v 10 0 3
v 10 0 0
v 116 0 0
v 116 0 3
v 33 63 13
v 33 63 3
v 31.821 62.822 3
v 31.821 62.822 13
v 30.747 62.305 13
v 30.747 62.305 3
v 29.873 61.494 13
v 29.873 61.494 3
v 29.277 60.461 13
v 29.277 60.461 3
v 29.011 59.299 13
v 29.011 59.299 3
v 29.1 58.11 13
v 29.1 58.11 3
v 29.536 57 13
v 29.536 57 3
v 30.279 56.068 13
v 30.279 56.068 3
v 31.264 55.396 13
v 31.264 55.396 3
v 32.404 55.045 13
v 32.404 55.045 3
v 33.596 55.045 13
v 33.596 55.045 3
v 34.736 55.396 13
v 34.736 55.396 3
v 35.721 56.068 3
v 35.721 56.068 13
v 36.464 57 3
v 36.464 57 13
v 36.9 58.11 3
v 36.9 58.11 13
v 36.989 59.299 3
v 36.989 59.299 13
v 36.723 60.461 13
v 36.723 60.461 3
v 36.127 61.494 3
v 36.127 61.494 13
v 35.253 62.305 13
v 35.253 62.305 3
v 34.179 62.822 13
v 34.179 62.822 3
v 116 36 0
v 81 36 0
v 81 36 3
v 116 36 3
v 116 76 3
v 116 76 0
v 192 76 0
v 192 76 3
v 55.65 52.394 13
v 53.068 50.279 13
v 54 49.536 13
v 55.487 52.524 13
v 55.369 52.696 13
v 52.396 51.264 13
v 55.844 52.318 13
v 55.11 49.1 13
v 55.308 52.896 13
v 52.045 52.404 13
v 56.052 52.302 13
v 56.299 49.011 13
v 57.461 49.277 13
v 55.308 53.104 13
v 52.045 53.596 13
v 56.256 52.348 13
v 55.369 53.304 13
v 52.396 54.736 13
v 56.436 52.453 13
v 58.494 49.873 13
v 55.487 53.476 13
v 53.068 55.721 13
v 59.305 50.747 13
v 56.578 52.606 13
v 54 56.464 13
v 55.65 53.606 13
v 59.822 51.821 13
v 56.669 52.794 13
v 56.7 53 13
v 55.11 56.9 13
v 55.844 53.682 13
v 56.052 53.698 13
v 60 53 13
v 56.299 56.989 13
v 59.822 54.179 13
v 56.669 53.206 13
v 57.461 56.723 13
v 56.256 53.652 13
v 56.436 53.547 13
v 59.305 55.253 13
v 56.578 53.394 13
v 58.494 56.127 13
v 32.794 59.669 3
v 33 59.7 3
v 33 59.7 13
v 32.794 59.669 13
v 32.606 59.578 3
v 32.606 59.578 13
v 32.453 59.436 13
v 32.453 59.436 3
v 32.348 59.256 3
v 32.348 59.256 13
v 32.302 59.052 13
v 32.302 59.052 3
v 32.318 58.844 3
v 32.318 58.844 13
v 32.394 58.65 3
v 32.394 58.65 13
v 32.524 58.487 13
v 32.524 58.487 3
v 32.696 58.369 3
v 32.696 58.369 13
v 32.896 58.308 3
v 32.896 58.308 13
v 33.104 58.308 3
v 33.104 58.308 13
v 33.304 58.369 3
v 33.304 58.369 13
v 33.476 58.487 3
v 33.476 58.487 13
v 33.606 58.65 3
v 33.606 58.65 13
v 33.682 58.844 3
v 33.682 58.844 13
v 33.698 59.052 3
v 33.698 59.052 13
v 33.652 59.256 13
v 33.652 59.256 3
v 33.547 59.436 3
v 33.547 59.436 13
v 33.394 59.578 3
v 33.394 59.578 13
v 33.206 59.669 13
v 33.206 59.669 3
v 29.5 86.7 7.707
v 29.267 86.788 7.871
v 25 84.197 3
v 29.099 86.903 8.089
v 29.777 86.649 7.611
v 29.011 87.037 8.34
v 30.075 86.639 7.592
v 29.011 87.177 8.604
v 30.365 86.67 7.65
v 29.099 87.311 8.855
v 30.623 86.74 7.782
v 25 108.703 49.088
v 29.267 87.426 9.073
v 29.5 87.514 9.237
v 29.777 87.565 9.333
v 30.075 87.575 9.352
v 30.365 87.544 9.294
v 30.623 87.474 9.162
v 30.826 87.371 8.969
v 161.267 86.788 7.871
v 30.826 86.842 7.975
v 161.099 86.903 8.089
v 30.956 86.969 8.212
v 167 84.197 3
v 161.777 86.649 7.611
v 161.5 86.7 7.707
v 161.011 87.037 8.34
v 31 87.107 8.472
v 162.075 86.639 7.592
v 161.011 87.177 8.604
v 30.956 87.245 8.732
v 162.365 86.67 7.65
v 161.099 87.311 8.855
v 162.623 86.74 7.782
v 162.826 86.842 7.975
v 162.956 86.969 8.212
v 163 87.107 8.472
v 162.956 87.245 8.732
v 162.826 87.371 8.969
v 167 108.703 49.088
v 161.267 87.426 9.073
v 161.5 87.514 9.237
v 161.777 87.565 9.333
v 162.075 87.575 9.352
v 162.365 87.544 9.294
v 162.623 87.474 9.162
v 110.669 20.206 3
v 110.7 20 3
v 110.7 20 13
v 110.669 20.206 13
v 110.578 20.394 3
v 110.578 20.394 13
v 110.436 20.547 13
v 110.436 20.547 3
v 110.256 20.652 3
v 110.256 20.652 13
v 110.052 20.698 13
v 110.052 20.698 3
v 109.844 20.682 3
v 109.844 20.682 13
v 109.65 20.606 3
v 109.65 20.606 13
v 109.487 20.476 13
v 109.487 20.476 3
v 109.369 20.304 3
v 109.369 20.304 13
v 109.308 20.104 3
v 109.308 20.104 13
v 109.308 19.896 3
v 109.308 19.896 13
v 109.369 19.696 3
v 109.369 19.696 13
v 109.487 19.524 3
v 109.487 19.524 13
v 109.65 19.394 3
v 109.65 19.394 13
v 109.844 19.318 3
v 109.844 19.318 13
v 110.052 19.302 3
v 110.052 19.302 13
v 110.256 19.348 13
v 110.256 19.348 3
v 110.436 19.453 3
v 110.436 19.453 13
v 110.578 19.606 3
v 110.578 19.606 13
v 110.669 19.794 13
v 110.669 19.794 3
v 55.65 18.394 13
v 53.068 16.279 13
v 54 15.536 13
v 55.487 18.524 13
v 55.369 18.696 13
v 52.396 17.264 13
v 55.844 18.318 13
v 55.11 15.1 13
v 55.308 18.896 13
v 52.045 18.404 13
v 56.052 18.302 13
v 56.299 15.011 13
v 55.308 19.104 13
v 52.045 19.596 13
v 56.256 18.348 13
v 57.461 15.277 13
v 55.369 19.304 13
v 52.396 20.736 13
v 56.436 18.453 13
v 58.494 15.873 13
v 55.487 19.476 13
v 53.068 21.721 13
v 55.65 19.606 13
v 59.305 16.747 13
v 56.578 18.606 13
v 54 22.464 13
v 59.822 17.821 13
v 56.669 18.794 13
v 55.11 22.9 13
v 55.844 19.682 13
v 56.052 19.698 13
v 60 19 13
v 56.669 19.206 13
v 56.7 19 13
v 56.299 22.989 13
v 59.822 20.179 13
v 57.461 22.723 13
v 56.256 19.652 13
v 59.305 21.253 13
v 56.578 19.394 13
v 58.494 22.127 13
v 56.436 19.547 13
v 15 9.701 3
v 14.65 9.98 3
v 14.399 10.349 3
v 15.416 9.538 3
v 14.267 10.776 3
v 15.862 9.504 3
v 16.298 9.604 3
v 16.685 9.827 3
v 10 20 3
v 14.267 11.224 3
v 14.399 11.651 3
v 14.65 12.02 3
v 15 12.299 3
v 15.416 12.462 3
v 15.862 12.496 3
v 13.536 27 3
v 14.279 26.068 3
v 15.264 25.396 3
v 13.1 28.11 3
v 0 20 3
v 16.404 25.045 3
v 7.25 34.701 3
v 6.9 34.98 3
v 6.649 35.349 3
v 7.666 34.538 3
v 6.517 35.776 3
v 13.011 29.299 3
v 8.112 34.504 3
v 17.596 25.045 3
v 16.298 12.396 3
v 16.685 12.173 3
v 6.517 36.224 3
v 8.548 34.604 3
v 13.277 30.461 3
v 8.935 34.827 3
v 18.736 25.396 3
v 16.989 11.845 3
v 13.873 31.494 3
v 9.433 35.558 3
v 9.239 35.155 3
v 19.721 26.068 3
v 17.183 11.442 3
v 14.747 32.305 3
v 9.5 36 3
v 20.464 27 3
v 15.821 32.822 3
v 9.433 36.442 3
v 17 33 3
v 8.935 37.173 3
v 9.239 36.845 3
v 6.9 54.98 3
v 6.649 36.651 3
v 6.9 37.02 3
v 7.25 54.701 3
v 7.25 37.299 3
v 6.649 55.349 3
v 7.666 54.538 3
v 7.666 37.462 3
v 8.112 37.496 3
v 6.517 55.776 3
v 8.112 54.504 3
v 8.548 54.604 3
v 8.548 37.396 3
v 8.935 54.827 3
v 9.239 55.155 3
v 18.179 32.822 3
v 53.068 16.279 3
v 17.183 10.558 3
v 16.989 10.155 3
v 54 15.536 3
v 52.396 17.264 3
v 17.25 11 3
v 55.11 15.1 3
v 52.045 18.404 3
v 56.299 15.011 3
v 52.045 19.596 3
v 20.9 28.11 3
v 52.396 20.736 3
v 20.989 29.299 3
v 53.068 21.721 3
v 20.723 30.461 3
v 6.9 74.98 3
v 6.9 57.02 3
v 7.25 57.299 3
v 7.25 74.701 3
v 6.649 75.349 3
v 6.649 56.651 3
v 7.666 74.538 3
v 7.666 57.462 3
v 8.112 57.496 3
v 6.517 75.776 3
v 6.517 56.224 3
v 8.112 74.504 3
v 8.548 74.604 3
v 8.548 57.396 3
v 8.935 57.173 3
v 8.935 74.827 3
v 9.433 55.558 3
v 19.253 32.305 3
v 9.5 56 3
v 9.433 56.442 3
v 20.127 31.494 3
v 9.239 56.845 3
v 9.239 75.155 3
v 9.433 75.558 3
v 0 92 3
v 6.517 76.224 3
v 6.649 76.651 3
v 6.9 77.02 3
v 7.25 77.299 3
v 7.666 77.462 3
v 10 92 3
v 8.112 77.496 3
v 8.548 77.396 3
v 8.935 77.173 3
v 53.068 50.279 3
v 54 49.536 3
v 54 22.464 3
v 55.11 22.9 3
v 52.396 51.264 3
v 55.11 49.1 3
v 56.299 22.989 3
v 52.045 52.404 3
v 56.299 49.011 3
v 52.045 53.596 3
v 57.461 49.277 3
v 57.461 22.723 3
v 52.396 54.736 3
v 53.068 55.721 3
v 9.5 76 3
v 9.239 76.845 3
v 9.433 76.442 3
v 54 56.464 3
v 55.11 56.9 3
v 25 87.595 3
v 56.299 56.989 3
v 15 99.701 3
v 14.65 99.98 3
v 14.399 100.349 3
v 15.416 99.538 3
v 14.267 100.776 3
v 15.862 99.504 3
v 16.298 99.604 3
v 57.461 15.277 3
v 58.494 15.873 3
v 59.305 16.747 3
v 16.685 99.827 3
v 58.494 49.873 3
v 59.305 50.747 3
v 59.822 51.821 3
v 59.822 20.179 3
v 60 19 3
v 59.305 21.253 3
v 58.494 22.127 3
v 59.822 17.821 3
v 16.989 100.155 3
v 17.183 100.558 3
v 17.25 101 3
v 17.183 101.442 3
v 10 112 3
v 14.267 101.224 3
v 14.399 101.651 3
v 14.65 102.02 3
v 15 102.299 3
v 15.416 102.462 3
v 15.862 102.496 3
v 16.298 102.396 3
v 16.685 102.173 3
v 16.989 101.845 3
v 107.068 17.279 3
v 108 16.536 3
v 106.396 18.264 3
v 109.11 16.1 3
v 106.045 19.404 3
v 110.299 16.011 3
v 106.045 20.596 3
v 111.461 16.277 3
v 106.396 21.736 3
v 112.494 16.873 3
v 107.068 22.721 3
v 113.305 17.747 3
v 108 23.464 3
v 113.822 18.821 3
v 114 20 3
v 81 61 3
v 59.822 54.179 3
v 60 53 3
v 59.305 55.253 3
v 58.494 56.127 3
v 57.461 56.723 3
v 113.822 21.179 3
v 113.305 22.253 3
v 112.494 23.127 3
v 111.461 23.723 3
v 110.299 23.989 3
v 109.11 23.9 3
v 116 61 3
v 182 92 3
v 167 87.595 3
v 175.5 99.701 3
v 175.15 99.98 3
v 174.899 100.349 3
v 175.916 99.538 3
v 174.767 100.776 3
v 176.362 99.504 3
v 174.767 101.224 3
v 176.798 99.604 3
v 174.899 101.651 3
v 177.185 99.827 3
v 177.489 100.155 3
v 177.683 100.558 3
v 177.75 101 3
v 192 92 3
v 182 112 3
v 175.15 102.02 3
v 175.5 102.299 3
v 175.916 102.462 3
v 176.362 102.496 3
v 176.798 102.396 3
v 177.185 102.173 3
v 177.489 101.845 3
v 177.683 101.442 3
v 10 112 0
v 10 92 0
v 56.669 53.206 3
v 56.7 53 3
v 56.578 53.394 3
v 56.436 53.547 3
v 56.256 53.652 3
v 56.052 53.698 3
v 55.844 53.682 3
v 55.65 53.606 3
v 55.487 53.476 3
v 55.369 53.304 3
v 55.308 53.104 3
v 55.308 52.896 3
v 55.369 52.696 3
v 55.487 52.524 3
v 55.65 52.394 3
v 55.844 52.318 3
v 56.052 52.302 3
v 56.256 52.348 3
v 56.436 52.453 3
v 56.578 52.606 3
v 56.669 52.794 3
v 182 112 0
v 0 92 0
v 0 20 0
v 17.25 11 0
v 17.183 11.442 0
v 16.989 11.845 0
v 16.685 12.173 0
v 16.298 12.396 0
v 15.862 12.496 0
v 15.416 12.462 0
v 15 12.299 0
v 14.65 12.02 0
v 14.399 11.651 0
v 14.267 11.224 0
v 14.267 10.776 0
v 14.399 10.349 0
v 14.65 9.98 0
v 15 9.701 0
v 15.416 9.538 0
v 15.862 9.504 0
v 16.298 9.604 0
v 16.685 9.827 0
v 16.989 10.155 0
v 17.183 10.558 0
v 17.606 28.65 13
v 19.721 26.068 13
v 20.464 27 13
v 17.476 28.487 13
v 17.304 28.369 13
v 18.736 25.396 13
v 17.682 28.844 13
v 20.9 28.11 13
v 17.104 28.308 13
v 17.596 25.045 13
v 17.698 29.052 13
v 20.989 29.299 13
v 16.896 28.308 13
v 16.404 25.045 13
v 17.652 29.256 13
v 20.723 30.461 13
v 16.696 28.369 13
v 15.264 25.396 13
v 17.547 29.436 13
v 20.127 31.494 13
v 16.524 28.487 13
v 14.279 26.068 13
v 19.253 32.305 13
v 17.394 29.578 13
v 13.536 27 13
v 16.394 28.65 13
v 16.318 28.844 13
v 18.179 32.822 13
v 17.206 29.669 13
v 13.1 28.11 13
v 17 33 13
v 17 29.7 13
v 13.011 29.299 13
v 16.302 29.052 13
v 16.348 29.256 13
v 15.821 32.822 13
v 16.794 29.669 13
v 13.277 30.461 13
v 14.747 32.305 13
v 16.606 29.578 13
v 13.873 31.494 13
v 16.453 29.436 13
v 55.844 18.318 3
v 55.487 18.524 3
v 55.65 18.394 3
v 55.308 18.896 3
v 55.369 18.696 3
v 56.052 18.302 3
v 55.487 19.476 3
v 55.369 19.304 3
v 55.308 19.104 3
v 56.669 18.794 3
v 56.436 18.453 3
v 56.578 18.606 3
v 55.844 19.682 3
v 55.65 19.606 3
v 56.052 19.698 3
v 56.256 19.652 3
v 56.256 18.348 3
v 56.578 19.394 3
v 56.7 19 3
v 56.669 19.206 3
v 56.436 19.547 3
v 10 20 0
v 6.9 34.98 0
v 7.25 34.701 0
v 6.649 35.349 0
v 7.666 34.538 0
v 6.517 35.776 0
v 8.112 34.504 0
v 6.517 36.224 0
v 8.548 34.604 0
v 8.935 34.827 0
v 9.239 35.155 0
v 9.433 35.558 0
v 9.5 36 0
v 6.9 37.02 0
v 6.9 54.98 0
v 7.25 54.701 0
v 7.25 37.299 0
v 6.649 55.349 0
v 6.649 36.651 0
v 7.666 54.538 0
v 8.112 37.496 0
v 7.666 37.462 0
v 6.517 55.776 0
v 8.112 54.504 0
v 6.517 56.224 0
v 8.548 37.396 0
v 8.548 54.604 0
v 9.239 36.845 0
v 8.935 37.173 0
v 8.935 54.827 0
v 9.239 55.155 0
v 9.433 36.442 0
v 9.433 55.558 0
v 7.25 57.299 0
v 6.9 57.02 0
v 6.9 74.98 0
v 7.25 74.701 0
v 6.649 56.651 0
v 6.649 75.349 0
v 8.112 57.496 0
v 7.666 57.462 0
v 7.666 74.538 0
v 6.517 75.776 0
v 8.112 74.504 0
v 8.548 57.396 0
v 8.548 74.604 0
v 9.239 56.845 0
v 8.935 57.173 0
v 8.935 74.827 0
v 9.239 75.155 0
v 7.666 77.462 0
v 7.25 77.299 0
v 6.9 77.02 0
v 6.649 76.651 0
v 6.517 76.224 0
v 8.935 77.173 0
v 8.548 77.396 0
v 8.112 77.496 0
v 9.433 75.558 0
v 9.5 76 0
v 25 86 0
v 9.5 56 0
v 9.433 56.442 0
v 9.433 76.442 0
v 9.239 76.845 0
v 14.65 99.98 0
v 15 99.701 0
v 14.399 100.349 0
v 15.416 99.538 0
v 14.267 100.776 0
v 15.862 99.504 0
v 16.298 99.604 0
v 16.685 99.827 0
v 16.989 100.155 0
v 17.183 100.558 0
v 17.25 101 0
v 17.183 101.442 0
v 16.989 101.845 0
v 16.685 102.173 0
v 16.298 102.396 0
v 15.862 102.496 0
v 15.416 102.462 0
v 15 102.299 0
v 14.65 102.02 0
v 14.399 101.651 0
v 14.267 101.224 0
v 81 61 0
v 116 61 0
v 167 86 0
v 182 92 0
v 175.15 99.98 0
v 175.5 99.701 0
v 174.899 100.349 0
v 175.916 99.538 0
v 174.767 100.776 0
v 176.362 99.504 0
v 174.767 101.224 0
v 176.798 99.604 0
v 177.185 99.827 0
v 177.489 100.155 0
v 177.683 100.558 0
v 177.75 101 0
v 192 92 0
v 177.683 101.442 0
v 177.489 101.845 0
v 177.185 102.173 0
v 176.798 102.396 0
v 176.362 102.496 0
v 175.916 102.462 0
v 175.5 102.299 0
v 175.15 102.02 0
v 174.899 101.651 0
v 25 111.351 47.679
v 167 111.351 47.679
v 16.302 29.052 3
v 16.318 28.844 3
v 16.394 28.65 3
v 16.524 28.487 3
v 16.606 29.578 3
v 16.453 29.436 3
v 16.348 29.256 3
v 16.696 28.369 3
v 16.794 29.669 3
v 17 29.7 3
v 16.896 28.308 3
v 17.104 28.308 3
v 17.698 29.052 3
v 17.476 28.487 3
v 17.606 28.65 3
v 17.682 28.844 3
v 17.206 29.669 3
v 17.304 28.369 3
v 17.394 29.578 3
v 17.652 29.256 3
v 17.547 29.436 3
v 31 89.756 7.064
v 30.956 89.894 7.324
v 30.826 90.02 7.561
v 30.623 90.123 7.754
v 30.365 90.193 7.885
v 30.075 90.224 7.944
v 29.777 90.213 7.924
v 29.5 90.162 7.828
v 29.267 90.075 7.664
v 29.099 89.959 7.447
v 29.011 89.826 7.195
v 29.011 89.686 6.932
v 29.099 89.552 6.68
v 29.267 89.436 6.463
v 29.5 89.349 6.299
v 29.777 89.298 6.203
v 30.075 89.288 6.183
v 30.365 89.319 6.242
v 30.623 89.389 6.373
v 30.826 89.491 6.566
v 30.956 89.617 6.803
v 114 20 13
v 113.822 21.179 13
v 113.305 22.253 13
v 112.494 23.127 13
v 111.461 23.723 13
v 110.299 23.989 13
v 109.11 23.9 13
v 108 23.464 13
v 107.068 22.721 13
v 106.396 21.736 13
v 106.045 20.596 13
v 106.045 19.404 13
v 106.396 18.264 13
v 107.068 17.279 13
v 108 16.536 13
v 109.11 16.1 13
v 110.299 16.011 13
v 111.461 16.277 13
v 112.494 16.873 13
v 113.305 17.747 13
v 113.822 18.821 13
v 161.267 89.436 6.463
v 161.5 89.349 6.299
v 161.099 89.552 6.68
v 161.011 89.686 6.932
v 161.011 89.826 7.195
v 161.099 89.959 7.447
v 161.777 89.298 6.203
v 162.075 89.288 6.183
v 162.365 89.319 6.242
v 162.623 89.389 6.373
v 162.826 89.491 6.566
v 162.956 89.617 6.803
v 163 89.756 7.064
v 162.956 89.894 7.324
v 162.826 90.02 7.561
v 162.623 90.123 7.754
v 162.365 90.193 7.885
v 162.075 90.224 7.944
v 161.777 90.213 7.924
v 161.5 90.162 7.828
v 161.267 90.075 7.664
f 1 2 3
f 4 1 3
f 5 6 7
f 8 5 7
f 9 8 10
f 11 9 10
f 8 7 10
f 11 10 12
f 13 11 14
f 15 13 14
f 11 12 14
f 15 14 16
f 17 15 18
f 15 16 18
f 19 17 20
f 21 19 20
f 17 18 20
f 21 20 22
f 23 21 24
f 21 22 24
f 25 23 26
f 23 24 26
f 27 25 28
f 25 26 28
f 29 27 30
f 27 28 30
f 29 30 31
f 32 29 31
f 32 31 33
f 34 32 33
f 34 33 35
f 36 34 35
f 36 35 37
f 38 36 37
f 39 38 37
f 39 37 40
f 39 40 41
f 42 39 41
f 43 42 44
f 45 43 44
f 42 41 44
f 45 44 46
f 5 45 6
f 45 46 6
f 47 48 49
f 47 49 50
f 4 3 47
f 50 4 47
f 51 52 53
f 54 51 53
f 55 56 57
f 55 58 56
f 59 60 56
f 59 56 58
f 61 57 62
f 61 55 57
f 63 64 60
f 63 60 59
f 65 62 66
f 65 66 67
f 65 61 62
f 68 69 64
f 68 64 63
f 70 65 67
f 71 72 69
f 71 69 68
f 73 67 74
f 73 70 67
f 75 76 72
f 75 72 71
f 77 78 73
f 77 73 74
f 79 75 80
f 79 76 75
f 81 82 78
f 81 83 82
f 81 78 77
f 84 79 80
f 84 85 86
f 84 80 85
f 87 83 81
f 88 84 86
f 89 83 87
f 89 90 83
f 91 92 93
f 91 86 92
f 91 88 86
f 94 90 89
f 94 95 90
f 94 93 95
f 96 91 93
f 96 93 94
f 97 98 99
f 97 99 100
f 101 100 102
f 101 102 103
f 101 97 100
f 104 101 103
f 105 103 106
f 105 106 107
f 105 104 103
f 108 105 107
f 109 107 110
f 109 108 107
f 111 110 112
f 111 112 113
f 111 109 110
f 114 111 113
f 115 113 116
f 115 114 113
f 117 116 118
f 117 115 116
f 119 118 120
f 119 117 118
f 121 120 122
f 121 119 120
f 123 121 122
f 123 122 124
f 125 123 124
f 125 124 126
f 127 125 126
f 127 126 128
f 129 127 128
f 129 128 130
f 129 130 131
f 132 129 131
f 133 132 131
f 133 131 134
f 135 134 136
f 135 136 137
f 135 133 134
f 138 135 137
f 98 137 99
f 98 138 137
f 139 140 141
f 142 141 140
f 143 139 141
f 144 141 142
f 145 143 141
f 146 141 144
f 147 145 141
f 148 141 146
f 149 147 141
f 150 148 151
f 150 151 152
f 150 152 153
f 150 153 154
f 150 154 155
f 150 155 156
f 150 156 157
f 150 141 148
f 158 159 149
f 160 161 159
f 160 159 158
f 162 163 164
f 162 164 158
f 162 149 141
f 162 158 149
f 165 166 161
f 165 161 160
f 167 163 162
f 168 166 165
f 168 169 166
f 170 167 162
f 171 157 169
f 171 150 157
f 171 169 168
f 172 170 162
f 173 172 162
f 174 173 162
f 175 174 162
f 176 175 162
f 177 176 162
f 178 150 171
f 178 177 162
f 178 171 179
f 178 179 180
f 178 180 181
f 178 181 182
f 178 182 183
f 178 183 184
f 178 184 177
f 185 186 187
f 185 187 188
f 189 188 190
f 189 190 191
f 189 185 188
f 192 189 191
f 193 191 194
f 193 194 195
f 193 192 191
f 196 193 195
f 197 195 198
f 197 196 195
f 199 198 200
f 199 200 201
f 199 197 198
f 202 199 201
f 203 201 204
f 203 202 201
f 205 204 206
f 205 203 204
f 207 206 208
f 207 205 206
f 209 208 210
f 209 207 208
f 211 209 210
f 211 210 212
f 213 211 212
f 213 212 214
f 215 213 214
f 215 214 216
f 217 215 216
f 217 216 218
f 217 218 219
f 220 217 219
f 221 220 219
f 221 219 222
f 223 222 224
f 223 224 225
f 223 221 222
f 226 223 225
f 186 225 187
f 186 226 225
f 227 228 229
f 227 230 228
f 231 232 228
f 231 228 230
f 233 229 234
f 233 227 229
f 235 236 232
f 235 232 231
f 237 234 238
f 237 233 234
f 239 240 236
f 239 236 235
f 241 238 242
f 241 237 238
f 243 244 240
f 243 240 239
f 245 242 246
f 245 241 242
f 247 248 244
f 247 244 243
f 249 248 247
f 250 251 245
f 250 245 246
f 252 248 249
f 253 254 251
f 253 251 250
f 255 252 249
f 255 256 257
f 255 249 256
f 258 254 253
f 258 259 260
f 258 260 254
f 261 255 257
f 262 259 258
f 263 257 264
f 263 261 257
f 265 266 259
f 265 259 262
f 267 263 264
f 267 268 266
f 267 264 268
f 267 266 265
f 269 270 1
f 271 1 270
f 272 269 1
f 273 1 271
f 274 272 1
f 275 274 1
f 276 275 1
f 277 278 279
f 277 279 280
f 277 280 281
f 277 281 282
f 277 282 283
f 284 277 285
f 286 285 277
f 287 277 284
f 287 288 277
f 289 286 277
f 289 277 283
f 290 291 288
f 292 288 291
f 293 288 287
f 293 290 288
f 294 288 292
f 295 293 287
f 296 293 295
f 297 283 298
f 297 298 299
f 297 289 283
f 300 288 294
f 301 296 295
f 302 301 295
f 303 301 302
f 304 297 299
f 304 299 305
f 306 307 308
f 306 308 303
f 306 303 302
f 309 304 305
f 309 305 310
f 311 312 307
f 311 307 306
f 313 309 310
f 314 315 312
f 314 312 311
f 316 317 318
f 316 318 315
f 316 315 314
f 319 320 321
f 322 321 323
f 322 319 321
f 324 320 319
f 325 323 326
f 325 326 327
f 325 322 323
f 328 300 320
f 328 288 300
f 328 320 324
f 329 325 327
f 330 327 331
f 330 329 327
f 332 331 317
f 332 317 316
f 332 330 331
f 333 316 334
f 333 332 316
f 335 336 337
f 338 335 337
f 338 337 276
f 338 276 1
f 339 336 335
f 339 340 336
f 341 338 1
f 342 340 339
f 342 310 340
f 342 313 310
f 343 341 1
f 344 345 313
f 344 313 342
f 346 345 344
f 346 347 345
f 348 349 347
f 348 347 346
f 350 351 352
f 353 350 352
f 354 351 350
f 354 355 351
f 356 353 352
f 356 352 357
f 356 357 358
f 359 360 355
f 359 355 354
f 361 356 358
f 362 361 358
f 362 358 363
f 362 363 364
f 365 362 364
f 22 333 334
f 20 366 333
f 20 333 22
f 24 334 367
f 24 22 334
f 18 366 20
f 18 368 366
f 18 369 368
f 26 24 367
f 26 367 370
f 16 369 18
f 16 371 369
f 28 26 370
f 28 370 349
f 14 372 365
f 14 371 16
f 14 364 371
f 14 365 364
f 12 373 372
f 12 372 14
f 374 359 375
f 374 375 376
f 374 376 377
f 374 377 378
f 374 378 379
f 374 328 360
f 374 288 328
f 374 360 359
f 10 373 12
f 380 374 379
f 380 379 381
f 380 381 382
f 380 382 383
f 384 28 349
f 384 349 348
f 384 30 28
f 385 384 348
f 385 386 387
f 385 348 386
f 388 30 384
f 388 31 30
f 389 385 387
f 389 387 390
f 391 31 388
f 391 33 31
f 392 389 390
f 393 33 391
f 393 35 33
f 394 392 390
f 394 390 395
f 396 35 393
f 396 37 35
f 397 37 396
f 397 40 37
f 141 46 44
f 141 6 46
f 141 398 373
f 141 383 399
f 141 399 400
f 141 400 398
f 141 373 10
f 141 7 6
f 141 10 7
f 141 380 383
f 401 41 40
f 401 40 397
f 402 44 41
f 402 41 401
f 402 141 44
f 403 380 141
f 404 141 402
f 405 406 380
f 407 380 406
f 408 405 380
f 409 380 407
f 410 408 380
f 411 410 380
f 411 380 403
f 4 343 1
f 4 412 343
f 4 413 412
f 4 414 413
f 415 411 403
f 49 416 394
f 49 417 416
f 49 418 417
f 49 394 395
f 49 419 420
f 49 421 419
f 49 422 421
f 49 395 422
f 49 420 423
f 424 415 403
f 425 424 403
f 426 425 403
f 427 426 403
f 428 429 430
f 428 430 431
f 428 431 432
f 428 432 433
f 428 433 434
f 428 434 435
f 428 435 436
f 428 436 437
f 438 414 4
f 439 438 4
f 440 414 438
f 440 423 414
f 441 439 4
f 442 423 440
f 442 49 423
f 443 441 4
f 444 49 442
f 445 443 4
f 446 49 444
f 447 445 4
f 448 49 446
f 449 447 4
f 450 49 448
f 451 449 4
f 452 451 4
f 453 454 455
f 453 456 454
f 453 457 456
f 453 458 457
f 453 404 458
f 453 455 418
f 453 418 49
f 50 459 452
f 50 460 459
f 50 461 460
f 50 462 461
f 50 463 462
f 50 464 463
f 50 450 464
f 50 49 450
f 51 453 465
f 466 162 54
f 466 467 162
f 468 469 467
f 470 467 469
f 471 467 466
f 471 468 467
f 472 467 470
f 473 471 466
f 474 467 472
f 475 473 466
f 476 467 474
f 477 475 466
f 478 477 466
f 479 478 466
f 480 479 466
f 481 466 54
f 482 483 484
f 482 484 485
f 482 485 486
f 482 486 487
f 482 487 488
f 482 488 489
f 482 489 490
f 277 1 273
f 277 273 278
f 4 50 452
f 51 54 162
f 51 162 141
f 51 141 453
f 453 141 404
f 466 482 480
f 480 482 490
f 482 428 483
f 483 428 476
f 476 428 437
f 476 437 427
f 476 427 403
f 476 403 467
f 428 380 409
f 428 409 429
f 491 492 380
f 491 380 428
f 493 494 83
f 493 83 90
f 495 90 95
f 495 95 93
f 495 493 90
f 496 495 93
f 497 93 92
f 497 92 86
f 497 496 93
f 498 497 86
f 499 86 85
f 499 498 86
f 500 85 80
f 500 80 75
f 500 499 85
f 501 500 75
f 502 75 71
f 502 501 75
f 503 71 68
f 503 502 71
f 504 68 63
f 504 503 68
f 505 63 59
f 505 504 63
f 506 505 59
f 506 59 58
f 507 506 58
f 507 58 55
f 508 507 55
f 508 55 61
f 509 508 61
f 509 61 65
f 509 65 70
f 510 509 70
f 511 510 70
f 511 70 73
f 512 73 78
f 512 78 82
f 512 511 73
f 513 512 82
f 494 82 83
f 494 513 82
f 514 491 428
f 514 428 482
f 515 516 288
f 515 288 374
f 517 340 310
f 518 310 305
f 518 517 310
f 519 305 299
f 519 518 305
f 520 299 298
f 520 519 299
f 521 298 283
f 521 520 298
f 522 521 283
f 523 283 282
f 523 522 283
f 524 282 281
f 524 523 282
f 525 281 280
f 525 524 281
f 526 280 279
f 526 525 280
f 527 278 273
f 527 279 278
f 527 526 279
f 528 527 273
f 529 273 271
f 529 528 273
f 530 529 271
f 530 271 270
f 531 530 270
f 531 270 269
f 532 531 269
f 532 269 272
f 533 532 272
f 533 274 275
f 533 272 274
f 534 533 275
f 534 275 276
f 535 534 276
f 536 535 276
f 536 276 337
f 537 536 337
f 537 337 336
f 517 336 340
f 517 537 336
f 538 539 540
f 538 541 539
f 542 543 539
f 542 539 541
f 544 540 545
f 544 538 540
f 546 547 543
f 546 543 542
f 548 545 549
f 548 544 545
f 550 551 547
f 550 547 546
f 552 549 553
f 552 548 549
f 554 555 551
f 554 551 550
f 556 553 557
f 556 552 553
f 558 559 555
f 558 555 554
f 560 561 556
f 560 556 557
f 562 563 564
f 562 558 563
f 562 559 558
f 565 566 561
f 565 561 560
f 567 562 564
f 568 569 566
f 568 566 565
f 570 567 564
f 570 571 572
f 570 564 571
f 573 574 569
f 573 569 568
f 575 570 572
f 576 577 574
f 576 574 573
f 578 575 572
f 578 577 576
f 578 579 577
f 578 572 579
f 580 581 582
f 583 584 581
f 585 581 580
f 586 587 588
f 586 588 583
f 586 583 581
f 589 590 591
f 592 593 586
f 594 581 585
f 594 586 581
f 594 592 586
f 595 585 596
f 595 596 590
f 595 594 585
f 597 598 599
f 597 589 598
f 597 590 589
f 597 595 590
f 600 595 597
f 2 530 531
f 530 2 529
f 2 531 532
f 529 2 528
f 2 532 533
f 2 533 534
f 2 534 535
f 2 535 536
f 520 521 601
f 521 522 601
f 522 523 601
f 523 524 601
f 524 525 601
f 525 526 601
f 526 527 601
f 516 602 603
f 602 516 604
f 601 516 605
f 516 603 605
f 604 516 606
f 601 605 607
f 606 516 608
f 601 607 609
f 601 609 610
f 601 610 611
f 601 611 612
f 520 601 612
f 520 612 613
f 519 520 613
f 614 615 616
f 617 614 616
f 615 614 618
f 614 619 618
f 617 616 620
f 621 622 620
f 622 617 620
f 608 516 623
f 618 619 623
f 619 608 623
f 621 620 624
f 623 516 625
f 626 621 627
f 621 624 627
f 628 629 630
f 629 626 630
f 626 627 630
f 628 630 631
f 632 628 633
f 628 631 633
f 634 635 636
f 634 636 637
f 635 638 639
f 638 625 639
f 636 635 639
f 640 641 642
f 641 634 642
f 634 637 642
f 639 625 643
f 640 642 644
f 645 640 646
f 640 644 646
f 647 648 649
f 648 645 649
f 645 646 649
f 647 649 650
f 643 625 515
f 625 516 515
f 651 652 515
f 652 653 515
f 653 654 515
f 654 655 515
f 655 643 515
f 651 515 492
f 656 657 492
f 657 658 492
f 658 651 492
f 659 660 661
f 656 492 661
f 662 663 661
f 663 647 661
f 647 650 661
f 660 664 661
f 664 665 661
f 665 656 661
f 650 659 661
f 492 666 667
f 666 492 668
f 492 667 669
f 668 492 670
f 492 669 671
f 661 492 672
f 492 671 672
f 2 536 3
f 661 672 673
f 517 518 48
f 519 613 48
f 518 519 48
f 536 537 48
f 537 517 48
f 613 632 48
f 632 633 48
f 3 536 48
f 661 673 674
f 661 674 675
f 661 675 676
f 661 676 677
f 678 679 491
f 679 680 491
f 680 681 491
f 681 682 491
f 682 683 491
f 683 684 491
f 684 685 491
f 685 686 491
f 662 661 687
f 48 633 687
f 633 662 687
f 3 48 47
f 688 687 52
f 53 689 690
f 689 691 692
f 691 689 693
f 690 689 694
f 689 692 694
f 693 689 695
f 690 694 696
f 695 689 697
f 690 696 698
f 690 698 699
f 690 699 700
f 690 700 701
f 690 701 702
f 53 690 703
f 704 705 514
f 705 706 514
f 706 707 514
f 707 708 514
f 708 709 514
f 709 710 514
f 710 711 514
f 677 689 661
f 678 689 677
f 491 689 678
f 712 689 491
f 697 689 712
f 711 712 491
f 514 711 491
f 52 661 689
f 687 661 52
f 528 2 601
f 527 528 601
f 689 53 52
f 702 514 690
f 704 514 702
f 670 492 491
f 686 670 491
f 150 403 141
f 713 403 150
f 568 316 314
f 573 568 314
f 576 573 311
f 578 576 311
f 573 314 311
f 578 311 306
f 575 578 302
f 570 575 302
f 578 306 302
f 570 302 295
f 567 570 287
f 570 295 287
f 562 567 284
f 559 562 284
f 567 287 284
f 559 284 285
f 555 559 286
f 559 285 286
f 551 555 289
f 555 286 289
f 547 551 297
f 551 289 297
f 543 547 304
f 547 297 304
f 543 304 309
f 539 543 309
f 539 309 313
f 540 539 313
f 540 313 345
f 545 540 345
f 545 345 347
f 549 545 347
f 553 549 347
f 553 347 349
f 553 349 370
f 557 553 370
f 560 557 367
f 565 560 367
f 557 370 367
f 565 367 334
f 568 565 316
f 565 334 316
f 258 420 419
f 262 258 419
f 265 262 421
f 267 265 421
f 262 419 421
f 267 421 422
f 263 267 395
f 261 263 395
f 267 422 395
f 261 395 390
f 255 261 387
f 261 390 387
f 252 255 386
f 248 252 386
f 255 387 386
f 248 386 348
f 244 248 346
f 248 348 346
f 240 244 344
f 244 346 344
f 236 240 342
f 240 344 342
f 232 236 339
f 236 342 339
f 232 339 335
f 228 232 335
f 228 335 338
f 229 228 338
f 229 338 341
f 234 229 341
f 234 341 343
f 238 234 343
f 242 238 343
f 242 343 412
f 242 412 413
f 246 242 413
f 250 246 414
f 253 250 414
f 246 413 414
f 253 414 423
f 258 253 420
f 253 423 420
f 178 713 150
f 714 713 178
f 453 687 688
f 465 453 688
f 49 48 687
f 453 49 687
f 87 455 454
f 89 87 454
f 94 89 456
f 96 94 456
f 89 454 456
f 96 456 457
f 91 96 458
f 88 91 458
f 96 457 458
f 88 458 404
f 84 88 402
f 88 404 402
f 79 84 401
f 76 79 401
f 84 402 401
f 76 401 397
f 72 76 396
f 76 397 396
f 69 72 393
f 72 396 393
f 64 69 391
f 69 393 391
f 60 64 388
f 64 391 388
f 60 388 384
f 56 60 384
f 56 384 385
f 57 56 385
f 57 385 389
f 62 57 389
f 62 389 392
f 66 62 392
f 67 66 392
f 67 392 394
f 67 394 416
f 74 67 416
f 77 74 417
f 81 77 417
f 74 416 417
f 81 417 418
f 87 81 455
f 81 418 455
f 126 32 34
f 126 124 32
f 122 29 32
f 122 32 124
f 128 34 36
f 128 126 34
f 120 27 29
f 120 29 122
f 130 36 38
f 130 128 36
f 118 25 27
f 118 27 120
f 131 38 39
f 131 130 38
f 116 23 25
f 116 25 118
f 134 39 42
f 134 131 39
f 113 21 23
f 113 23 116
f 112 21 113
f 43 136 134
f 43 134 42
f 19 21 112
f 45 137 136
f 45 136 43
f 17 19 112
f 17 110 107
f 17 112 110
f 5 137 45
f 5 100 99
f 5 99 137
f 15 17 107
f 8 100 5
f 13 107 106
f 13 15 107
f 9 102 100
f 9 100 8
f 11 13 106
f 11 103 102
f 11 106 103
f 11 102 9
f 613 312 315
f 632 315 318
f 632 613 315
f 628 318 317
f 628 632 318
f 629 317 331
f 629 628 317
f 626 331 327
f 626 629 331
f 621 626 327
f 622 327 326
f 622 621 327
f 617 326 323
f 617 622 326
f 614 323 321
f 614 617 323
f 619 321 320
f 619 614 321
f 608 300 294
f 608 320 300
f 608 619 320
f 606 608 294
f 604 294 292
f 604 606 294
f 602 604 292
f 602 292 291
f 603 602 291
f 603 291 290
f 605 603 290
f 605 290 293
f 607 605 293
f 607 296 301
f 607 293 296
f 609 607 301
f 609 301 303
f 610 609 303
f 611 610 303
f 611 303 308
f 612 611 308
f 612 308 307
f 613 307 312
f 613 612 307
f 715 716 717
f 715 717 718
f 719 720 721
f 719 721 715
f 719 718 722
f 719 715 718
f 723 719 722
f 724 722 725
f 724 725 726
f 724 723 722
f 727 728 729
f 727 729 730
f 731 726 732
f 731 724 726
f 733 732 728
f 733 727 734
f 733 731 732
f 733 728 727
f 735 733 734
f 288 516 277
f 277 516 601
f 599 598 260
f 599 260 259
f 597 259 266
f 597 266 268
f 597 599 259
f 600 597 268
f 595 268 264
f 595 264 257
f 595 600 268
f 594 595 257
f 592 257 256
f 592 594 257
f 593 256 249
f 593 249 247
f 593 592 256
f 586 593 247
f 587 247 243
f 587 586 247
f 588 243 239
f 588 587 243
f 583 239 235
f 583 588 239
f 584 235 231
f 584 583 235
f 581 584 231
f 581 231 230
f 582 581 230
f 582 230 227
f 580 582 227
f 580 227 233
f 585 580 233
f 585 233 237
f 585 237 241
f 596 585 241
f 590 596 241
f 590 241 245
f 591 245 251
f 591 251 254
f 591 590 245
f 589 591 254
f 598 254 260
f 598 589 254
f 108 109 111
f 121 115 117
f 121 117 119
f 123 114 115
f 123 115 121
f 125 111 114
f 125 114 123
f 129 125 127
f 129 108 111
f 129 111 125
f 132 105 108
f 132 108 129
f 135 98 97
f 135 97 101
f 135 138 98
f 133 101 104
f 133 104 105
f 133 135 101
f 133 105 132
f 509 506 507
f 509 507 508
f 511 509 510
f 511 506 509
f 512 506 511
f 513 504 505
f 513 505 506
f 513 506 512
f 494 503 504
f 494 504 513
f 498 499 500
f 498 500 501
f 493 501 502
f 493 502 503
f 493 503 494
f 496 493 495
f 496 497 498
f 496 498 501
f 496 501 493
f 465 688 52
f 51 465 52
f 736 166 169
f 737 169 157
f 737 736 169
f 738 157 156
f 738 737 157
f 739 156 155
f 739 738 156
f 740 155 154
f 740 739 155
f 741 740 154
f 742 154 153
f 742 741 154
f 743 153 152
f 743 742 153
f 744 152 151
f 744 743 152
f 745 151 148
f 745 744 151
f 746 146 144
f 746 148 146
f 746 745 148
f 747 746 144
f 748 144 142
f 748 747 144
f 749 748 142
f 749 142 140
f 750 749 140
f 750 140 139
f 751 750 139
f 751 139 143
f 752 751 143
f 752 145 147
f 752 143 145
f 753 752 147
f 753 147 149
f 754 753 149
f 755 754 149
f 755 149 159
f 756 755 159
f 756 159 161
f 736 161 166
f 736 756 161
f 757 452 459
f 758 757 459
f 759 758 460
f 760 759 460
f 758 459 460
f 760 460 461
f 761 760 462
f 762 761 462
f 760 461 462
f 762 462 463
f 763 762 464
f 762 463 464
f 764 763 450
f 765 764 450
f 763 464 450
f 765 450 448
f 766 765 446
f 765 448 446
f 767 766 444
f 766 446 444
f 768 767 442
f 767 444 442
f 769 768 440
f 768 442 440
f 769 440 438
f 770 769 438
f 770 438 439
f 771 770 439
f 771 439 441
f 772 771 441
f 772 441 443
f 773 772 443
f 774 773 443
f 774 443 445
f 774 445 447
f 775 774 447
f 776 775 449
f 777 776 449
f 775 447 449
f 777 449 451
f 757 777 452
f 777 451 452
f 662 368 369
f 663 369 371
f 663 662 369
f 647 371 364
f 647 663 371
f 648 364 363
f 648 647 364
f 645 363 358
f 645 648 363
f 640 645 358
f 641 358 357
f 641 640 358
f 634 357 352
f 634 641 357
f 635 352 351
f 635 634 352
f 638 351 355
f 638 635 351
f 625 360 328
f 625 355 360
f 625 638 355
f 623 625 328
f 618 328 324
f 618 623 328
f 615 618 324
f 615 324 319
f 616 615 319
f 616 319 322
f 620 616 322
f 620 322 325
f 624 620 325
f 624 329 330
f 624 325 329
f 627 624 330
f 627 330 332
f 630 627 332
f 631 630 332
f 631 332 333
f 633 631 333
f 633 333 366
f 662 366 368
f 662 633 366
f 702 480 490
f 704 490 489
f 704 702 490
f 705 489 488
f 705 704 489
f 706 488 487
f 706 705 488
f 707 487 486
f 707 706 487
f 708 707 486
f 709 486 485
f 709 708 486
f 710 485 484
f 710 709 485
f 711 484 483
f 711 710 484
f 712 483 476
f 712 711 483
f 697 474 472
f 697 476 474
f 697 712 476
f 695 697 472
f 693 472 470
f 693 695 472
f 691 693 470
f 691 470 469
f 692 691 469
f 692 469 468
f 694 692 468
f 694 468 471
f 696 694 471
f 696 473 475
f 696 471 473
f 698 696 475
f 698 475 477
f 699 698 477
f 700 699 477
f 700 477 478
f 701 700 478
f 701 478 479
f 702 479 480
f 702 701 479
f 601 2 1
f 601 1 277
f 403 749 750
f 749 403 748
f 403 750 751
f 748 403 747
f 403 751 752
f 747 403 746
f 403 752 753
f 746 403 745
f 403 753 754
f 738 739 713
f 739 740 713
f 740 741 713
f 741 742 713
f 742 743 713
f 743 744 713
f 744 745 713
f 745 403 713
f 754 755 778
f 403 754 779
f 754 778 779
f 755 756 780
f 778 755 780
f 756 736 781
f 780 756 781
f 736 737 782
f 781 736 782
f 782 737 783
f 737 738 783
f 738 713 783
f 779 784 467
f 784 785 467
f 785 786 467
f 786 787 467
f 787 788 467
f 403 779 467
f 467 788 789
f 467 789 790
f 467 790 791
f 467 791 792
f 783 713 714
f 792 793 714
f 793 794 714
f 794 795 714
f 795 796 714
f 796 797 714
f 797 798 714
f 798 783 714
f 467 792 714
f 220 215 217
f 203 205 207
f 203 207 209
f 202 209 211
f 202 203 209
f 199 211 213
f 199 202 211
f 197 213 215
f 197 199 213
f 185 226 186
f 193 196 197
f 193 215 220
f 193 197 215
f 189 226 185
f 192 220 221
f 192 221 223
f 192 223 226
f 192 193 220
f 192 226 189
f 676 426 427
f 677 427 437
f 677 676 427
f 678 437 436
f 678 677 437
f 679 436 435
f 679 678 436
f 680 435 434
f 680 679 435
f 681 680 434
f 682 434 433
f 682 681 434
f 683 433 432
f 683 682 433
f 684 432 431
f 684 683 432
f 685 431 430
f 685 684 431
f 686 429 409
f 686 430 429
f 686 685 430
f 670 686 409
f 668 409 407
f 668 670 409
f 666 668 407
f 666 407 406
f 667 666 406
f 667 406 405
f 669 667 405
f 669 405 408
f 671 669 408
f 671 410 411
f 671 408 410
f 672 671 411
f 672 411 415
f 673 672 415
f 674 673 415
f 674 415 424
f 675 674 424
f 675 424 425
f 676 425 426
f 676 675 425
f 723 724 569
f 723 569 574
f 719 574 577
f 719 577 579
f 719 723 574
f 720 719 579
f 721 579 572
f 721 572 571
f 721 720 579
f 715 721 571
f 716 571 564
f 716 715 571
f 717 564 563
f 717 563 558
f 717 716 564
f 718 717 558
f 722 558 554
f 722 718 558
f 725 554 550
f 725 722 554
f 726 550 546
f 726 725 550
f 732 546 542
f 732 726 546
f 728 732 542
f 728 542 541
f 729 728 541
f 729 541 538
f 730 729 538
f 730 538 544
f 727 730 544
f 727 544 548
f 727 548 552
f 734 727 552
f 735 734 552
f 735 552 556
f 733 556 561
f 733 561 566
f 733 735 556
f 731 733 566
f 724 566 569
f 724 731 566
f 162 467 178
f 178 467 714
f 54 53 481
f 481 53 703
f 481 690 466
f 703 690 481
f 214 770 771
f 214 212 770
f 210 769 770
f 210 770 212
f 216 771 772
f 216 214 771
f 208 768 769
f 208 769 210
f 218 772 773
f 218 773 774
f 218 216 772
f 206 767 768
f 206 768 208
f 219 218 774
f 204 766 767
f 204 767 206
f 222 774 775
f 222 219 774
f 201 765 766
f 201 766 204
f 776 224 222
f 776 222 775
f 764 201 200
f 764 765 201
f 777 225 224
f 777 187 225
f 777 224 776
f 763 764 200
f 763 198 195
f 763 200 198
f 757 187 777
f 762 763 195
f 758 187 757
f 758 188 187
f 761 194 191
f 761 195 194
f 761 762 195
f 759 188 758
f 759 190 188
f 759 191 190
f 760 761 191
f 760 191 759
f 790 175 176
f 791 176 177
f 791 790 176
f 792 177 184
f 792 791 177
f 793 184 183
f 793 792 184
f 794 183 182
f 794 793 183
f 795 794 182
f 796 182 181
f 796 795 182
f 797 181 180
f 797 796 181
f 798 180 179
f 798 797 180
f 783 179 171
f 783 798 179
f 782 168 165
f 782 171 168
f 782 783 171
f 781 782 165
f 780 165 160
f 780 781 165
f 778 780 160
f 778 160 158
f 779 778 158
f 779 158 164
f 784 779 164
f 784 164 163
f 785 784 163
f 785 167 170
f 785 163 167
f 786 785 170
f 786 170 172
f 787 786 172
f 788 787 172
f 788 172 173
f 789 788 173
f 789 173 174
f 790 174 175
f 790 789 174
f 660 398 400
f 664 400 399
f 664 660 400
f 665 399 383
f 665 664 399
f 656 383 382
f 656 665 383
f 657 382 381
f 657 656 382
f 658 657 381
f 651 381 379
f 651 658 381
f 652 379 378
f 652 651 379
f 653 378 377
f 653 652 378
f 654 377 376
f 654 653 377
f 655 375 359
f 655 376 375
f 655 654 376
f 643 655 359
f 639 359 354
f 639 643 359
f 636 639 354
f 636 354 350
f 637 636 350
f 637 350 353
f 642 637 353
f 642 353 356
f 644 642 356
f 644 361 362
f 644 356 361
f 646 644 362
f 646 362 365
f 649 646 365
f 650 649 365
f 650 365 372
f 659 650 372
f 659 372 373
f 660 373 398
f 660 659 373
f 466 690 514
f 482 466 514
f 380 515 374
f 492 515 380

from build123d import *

# Parameters (mm, degrees)
BOX006_W                  = 35
BOX006_H                  = 25
BOX006_DEPTH              = 10
CYLINDER010_R             = 0.7
CYLINDER010_DEPTH         = 10
CYLINDER011_R             = 4
CYLINDER011_DEPTH         = 10
CYLINDER012_R             = 0.7
CYLINDER012_DEPTH         = 10
CYLINDER013_R             = 4
CYLINDER013_DEPTH         = 10
CYLINDER009_R             = 0.7
CYLINDER009_DEPTH         = 10
CYLINDER008_R             = 4
CYLINDER008_DEPTH         = 10
CYLINDER016_R             = 0.7
CYLINDER016_DEPTH         = 10
CYLINDER017_R             = 4
CYLINDER017_DEPTH         = 10
CYLINDER018_R             = 0.7
CYLINDER018_DEPTH         = 10
CYLINDER019_R             = 4
CYLINDER019_DEPTH         = 10
FUSION003_PLACEMENT_ANGLE = 90
CYLINDER006_R             = 1
CYLINDER006_DEPTH         = 10
CYLINDER007_R             = 1
CYLINDER007_DEPTH         = 10
BOX005_W                  = 142
BOX005_H                  = 54
BOX005_DEPTH              = 3
CUT010_PLACEMENT_ANGLE    = 62
CYLINDER_R                = 1.5
CYLINDER_DEPTH            = 10
CYLINDER001_R             = 1.5
CYLINDER001_DEPTH         = 10
CYLINDER002_R             = 1.5
CYLINDER002_DEPTH         = 10
CYLINDER003_R             = 1.5
CYLINDER003_DEPTH         = 10
CYLINDER004_R             = 1.5
CYLINDER004_DEPTH         = 10
CYLINDER005_R             = 1.5
CYLINDER005_DEPTH         = 10
BOX004_W                  = 76
BOX004_H                  = 76
BOX004_DEPTH              = 10
BOX002_W                  = 192
BOX002_H                  = 72
BOX002_DEPTH              = 3
BOX003_W                  = 172
BOX003_H                  = 112
BOX003_DEPTH              = 3
BOX001_W                  = 192
BOX001_H                  = 112
BOX001_DEPTH              = 3
BOX_W                     = 192
BOX_H                     = 112
BOX_DEPTH                 = 3


with BuildPart() as cube006:
    # Box006 → Box006 (new body)
    with BuildSketch(Plane(origin=(81, 36, 0), x_dir=(1, 0, 0), z_dir=(0, 0, 1))):
        with Locations((17.5, 12.5)):
            Rectangle(BOX006_W, BOX006_H)
    extrude(amount=BOX006_DEPTH)


with BuildPart() as cylinder010:
    # Cylinder010 → Cylinder010 (new body)
    with BuildSketch(Plane.XY.offset(3)):
        Circle(CYLINDER010_R)
    extrude(amount=CYLINDER010_DEPTH)


with BuildPart() as cut012:
    # Cylinder011 → Cylinder011 (new body)
    with BuildSketch(Plane.XY.offset(3)):
        Circle(CYLINDER011_R)
    extrude(amount=CYLINDER011_DEPTH)

    # Cut012: cut Cylinder010
    add(cylinder010.part, mode=Mode.SUBTRACT)


with BuildPart() as cut012_1:
    # Cut012 placement: moved
    add(cut012.part.moved(Location((0, 34, 0))))


with BuildPart() as cylinder012:
    # Cylinder012 → Cylinder012 (new body)
    with BuildSketch(Plane.XY.offset(3)):
        Circle(CYLINDER012_R)
    extrude(amount=CYLINDER012_DEPTH)


with BuildPart() as cut013:
    # Cylinder013 → Cylinder013 (new body)
    with BuildSketch(Plane.XY.offset(3)):
        Circle(CYLINDER013_R)
    extrude(amount=CYLINDER013_DEPTH)

    # Cut013: cut Cylinder012
    add(cylinder012.part, mode=Mode.SUBTRACT)


with BuildPart() as cut013_1:
    # Cut013 placement: moved
    add(cut013.part.moved(Location((54, 1, 0))))


with BuildPart() as cylinder009:
    # Cylinder009 → Cylinder009 (new body)
    with BuildSketch(Plane.XY.offset(3)):
        Circle(CYLINDER009_R)
    extrude(amount=CYLINDER009_DEPTH)


with BuildPart() as fusion002:
    # Cylinder008 → Cylinder008 (new body)
    with BuildSketch(Plane.XY.offset(3)):
        Circle(CYLINDER008_R)
    extrude(amount=CYLINDER008_DEPTH)

    # Cut011: cut Cylinder009
    add(cylinder009.part, mode=Mode.SUBTRACT)

    # Fusion002: union Cut012, Cut013
    add(cut012_1.part)
    add(cut013_1.part)


with BuildPart() as fusion002_1:
    # Fusion002 placement: moved
    add(fusion002.part.moved(Location((56, 19, 0))))


with BuildPart() as cylinder016:
    # Cylinder016 → Cylinder016 (new body)
    with BuildSketch(Plane.XY.offset(3)):
        Circle(CYLINDER016_R)
    extrude(amount=CYLINDER016_DEPTH)


with BuildPart() as cut015:
    # Cylinder017 → Cylinder017 (new body)
    with BuildSketch(Plane.XY.offset(3)):
        Circle(CYLINDER017_R)
    extrude(amount=CYLINDER017_DEPTH)

    # Cut015: cut Cylinder016
    add(cylinder016.part, mode=Mode.SUBTRACT)


with BuildPart() as cut015_1:
    # Cut015 placement: moved
    add(cut015.part.moved(Location((0, 16, 0))))


with BuildPart() as cylinder018:
    # Cylinder018 → Cylinder018 (new body)
    with BuildSketch(Plane.XY.offset(3)):
        Circle(CYLINDER018_R)
    extrude(amount=CYLINDER018_DEPTH)


with BuildPart() as fusion003:
    # Cylinder019 → Cylinder019 (new body)
    with BuildSketch(Plane.XY.offset(3)):
        Circle(CYLINDER019_R)
    extrude(amount=CYLINDER019_DEPTH)

    # Cut016: cut Cylinder018
    add(cylinder018.part, mode=Mode.SUBTRACT)


with BuildPart() as fusion003_1:
    # Cut016 placement: moved
    add(fusion003.part.moved(Location((30, 0, 0))))

    # Fusion003: union Cut015
    add(cut015_1.part)


with BuildPart() as fusion003_2:
    # Fusion003 placement: moved
    add(fusion003_1.part.moved(Location((33, 29, 0))).rotate(Axis((33, 29, 0), (0, 0, 1)), FUSION003_PLACEMENT_ANGLE))


with BuildPart() as cylinder006:
    # Cylinder006 → Cylinder006 (new body)
    with BuildSketch(Plane(origin=(5, 8, 0), x_dir=(1, 0, 0), z_dir=(0, 0, 1))):
        Circle(CYLINDER006_R)
    extrude(amount=CYLINDER006_DEPTH)


with BuildPart() as cylinder007:
    # Cylinder007 → Cylinder007 (new body)
    with BuildSketch(Plane(origin=(137, 8, 0), x_dir=(1, 0, 0), z_dir=(0, 0, 1))):
        Circle(CYLINDER007_R)
    extrude(amount=CYLINDER007_DEPTH)


with BuildPart() as cut010:
    # Box005 → Box005 (new body)
    with BuildSketch(Plane.XY):
        with Locations((71, 27)):
            Rectangle(BOX005_W, BOX005_H)
    extrude(amount=BOX005_DEPTH)

    # Cut009: cut Cylinder007
    add(cylinder007.part, mode=Mode.SUBTRACT)

    # Cut010: cut Cylinder006
    add(cylinder006.part, mode=Mode.SUBTRACT)


with BuildPart() as cut010_1:
    # Cut010 placement: moved
    add(cut010.part.moved(Location((25, 86, 0))).rotate(Axis((25, 86, 0), (1, 0, 0)), CUT010_PLACEMENT_ANGLE))


with BuildPart() as cylinder:
    # Cylinder → Cylinder (new body)
    with BuildSketch(Plane(origin=(8, 56, 0), x_dir=(1, 0, 0), z_dir=(0, 0, 1))):
        Circle(CYLINDER_R)
    extrude(amount=CYLINDER_DEPTH)


with BuildPart() as cylinder001:
    # Cylinder001 → Cylinder001 (new body)
    with BuildSketch(Plane(origin=(8, 76, 0), x_dir=(1, 0, 0), z_dir=(0, 0, 1))):
        Circle(CYLINDER001_R)
    extrude(amount=CYLINDER001_DEPTH)


with BuildPart() as cylinder002:
    # Cylinder002 → Cylinder002 (new body)
    with BuildSketch(Plane(origin=(8, 36, 0), x_dir=(1, 0, 0), z_dir=(0, 0, 1))):
        Circle(CYLINDER002_R)
    extrude(amount=CYLINDER002_DEPTH)


with BuildPart() as cylinder003:
    # Cylinder003 → Cylinder003 (new body)
    with BuildSketch(Plane(origin=(15.75, 11, 0), x_dir=(1, 0, 0), z_dir=(0, 0, 1))):
        Circle(CYLINDER003_R)
    extrude(amount=CYLINDER003_DEPTH)


with BuildPart() as cylinder004:
    # Cylinder004 → Cylinder004 (new body)
    with BuildSketch(Plane(origin=(15.75, 101, 0), x_dir=(1, 0, 0), z_dir=(0, 0, 1))):
        Circle(CYLINDER004_R)
    extrude(amount=CYLINDER004_DEPTH)


with BuildPart() as cylinder005:
    # Cylinder005 → Cylinder005 (new body)
    with BuildSketch(Plane(origin=(176.25, 101, 0), x_dir=(1, 0, 0), z_dir=(0, 0, 1))):
        Circle(CYLINDER005_R)
    extrude(amount=CYLINDER005_DEPTH)


with BuildPart() as cube004:
    # Box004 → Box004 (new body)
    with BuildSketch(Plane(origin=(116, 0, 0), x_dir=(1, 0, 0), z_dir=(0, 0, 1))):
        with Locations((38, 38)):
            Rectangle(BOX004_W, BOX004_H)
    extrude(amount=BOX004_DEPTH)


with BuildPart() as cube002:
    # Box002 → Box002 (new body)
    with BuildSketch(Plane(origin=(0, 20, 0), x_dir=(1, 0, 0), z_dir=(0, 0, 1))):
        with Locations((96, 36)):
            Rectangle(BOX002_W, BOX002_H)
    extrude(amount=BOX002_DEPTH)


with BuildPart() as fusion:
    # Box003 → Box003 (new body)
    with BuildSketch(Plane(origin=(10, 0, 0), x_dir=(1, 0, 0), z_dir=(0, 0, 1))):
        with Locations((86, 56)):
            Rectangle(BOX003_W, BOX003_H)
    extrude(amount=BOX003_DEPTH)

    # Fusion: union Cube002
    add(cube002.part)


with BuildPart() as cut:
    # Box001 → Box001 (new body)
    with BuildSketch(Plane.XY):
        with Locations((96, 56)):
            Rectangle(BOX001_W, BOX001_H)
    extrude(amount=BOX001_DEPTH)

    # Cut: cut Fusion
    add(fusion.part, mode=Mode.SUBTRACT)


with BuildPart() as cut017:
    # Box → Box (new body)
    with BuildSketch(Plane.XY):
        with Locations((96, 56)):
            Rectangle(BOX_W, BOX_H)
    extrude(amount=BOX_DEPTH)

    # Cut001: cut Cut
    add(cut.part, mode=Mode.SUBTRACT)

    # Cut002: cut Cube004
    add(cube004.part, mode=Mode.SUBTRACT)

    # Cut003: cut Cylinder005
    add(cylinder005.part, mode=Mode.SUBTRACT)

    # Cut004: cut Cylinder004
    add(cylinder004.part, mode=Mode.SUBTRACT)

    # Cut005: cut Cylinder003
    add(cylinder003.part, mode=Mode.SUBTRACT)

    # Cut006: cut Cylinder002
    add(cylinder002.part, mode=Mode.SUBTRACT)

    # Cut007: cut Cylinder001
    add(cylinder001.part, mode=Mode.SUBTRACT)

    # Cut008: cut Cylinder
    add(cylinder.part, mode=Mode.SUBTRACT)

    # Fusion001: union Cut010
    add(cut010_1.part)

    # Fusion004: union Fusion002, Fusion003
    add(fusion002_1.part)
    add(fusion003_2.part)

    # Cut017: cut Cube006
    add(cube006.part, mode=Mode.SUBTRACT)


solid = cut017.part
